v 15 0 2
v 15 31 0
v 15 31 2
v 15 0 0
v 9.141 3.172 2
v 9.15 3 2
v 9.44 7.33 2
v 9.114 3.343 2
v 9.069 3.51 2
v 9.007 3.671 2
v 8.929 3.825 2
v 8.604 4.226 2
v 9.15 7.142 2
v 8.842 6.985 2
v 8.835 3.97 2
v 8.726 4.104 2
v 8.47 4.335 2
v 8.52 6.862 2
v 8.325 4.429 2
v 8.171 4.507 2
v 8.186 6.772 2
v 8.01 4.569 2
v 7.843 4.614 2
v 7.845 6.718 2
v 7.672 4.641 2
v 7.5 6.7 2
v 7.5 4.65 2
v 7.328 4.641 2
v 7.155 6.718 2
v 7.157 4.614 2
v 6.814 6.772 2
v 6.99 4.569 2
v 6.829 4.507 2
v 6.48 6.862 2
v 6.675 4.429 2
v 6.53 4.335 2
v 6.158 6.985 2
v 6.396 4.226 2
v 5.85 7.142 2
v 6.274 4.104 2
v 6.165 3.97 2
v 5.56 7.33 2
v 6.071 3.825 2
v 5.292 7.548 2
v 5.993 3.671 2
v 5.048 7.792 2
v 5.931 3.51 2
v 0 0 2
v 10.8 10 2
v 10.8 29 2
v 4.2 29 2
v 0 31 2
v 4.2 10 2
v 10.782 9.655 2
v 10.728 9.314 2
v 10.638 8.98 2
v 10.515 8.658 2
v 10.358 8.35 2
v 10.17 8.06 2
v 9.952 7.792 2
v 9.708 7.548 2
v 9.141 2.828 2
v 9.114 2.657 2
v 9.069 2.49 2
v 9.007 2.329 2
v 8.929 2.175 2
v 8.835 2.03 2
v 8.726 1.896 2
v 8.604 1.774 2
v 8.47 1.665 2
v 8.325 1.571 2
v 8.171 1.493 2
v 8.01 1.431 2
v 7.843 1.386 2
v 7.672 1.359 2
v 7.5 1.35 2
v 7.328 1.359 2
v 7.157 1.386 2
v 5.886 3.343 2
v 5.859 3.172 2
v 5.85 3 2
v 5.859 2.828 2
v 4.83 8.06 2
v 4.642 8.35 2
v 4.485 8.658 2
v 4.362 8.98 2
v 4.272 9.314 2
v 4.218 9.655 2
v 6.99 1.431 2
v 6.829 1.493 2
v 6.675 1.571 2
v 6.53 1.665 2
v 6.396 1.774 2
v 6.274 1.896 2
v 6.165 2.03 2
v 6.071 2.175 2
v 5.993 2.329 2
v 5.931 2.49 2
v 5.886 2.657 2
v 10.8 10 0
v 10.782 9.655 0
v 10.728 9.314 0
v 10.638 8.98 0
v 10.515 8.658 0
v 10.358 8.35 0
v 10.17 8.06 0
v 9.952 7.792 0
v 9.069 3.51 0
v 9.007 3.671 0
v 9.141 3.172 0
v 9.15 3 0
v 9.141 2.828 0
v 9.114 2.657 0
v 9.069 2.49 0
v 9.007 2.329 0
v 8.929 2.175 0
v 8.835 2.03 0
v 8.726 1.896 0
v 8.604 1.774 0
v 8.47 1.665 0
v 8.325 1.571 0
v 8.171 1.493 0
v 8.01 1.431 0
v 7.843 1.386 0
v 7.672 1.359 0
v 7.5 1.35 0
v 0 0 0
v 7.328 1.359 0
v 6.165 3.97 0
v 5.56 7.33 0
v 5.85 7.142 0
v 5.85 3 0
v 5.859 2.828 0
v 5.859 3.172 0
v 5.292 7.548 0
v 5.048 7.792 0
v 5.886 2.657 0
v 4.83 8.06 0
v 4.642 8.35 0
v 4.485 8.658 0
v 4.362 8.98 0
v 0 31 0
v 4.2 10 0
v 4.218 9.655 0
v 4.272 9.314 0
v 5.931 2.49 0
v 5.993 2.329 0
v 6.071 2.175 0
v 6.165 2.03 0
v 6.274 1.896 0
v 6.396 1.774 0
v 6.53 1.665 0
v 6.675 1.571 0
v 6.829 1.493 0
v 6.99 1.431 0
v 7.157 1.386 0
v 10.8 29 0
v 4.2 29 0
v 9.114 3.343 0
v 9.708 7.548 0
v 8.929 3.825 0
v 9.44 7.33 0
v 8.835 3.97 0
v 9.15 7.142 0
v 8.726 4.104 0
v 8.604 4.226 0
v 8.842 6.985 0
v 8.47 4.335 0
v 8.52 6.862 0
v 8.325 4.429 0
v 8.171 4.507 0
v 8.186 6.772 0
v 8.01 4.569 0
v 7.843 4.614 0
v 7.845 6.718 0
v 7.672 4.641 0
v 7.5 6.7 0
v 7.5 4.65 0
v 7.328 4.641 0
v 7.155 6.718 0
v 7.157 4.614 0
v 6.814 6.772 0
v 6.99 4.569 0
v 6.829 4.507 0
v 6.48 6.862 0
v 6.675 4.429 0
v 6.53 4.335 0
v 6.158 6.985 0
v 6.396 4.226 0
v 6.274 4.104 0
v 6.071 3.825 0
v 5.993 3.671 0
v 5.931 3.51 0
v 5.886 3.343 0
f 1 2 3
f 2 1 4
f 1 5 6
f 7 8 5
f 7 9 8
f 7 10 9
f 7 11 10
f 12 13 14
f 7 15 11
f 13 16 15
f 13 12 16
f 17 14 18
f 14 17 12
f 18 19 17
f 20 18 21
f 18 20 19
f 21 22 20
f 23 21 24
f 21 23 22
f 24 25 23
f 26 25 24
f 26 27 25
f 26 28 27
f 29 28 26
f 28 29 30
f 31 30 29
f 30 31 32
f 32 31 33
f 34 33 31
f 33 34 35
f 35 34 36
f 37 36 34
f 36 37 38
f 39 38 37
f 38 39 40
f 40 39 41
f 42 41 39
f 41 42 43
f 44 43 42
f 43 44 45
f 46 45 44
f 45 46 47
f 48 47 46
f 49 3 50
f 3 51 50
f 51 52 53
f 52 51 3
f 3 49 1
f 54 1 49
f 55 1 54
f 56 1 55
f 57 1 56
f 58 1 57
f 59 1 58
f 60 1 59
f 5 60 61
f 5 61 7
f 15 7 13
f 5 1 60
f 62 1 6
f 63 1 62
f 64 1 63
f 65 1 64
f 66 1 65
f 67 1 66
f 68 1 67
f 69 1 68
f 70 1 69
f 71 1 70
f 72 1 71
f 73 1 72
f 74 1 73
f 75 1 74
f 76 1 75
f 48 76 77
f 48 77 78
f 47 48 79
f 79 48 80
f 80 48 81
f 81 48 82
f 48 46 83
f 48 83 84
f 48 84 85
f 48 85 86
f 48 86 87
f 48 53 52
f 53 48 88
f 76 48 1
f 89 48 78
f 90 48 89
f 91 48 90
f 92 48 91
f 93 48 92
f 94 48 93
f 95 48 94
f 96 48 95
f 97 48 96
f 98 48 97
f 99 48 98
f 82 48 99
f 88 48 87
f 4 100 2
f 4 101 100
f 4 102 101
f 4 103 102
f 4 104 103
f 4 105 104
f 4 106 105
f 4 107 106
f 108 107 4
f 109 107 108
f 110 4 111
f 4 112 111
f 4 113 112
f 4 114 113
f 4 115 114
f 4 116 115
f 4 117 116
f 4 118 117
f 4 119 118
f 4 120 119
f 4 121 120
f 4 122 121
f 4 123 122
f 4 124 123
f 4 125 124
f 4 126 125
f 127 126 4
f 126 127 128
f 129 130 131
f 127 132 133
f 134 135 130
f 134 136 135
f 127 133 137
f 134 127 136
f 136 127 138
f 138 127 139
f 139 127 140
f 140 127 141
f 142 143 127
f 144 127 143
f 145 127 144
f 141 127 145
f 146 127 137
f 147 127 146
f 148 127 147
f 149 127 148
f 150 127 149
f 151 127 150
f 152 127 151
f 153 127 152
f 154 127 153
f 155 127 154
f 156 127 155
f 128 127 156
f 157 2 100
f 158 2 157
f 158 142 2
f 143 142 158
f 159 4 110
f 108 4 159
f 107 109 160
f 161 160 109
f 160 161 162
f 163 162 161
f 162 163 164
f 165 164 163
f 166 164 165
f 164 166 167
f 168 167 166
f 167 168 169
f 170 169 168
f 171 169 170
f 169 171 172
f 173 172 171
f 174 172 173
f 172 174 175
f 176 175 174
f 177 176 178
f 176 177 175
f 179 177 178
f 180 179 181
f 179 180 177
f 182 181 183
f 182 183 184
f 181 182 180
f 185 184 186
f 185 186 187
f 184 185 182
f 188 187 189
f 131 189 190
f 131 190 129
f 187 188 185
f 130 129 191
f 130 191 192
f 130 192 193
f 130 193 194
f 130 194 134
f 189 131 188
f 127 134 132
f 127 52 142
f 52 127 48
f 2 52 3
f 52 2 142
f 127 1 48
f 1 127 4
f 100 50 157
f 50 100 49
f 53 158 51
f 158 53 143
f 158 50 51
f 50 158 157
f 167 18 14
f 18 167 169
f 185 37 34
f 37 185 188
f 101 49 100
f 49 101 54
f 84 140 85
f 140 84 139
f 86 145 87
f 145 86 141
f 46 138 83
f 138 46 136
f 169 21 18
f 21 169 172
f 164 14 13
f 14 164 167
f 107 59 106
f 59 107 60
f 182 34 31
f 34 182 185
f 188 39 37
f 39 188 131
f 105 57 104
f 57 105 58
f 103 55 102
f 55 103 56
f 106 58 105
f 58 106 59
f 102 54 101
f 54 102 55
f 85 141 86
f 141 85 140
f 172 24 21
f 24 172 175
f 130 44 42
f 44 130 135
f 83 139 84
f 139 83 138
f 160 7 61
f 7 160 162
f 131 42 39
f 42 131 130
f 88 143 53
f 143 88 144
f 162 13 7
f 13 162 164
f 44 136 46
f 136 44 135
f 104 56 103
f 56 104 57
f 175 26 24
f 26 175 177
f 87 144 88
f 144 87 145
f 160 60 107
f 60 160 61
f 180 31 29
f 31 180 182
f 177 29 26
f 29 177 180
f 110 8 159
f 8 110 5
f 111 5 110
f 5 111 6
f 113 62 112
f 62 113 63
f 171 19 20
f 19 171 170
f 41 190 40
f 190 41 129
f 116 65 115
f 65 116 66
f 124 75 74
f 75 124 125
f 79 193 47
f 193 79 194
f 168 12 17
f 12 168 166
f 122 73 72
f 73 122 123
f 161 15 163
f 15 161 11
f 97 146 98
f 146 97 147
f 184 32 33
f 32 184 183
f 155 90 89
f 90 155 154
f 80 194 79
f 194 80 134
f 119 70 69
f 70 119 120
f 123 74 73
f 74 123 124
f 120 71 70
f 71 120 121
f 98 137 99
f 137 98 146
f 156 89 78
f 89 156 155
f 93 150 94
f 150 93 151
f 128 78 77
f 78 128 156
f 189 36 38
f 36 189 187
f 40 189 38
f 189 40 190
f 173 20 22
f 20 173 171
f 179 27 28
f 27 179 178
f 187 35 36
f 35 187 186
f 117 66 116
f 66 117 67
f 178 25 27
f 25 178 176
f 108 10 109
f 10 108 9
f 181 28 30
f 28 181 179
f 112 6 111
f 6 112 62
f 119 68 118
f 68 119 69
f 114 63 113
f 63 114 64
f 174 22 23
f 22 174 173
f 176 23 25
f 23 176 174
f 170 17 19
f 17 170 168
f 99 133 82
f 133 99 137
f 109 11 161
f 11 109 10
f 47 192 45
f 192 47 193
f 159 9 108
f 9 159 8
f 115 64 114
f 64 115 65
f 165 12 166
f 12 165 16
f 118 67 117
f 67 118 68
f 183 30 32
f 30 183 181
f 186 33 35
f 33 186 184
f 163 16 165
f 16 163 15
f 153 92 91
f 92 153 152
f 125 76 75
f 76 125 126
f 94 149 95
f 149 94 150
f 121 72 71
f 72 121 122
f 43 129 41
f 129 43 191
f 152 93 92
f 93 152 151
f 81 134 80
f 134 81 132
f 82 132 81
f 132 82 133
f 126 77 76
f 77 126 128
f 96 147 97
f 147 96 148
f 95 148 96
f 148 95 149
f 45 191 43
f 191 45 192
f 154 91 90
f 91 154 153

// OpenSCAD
$fn=60;
lenToWall=10;
lenToRing=23;
width=15;
ringToEdge=8;

carveWidth=6.6;
carveLen=19;



difference() {
    union() {
       cube([width, lenToRing+ringToEdge, 2]);
    }
    translate([width/2-carveWidth/2, 10, 0]) cube([carveWidth, carveLen, 3]);
    translate([width/2, lenToWall, 0]) cylinder(r=carveWidth/2, h=15); // wall side carve
    translate([width/2, 3, 0]) cylinder(r=1.65, h=15); // wall side 3m fix

}

//    translate([width/2, lenToRing, 0]) cylinder(r=0.5, h=10); // ring position
